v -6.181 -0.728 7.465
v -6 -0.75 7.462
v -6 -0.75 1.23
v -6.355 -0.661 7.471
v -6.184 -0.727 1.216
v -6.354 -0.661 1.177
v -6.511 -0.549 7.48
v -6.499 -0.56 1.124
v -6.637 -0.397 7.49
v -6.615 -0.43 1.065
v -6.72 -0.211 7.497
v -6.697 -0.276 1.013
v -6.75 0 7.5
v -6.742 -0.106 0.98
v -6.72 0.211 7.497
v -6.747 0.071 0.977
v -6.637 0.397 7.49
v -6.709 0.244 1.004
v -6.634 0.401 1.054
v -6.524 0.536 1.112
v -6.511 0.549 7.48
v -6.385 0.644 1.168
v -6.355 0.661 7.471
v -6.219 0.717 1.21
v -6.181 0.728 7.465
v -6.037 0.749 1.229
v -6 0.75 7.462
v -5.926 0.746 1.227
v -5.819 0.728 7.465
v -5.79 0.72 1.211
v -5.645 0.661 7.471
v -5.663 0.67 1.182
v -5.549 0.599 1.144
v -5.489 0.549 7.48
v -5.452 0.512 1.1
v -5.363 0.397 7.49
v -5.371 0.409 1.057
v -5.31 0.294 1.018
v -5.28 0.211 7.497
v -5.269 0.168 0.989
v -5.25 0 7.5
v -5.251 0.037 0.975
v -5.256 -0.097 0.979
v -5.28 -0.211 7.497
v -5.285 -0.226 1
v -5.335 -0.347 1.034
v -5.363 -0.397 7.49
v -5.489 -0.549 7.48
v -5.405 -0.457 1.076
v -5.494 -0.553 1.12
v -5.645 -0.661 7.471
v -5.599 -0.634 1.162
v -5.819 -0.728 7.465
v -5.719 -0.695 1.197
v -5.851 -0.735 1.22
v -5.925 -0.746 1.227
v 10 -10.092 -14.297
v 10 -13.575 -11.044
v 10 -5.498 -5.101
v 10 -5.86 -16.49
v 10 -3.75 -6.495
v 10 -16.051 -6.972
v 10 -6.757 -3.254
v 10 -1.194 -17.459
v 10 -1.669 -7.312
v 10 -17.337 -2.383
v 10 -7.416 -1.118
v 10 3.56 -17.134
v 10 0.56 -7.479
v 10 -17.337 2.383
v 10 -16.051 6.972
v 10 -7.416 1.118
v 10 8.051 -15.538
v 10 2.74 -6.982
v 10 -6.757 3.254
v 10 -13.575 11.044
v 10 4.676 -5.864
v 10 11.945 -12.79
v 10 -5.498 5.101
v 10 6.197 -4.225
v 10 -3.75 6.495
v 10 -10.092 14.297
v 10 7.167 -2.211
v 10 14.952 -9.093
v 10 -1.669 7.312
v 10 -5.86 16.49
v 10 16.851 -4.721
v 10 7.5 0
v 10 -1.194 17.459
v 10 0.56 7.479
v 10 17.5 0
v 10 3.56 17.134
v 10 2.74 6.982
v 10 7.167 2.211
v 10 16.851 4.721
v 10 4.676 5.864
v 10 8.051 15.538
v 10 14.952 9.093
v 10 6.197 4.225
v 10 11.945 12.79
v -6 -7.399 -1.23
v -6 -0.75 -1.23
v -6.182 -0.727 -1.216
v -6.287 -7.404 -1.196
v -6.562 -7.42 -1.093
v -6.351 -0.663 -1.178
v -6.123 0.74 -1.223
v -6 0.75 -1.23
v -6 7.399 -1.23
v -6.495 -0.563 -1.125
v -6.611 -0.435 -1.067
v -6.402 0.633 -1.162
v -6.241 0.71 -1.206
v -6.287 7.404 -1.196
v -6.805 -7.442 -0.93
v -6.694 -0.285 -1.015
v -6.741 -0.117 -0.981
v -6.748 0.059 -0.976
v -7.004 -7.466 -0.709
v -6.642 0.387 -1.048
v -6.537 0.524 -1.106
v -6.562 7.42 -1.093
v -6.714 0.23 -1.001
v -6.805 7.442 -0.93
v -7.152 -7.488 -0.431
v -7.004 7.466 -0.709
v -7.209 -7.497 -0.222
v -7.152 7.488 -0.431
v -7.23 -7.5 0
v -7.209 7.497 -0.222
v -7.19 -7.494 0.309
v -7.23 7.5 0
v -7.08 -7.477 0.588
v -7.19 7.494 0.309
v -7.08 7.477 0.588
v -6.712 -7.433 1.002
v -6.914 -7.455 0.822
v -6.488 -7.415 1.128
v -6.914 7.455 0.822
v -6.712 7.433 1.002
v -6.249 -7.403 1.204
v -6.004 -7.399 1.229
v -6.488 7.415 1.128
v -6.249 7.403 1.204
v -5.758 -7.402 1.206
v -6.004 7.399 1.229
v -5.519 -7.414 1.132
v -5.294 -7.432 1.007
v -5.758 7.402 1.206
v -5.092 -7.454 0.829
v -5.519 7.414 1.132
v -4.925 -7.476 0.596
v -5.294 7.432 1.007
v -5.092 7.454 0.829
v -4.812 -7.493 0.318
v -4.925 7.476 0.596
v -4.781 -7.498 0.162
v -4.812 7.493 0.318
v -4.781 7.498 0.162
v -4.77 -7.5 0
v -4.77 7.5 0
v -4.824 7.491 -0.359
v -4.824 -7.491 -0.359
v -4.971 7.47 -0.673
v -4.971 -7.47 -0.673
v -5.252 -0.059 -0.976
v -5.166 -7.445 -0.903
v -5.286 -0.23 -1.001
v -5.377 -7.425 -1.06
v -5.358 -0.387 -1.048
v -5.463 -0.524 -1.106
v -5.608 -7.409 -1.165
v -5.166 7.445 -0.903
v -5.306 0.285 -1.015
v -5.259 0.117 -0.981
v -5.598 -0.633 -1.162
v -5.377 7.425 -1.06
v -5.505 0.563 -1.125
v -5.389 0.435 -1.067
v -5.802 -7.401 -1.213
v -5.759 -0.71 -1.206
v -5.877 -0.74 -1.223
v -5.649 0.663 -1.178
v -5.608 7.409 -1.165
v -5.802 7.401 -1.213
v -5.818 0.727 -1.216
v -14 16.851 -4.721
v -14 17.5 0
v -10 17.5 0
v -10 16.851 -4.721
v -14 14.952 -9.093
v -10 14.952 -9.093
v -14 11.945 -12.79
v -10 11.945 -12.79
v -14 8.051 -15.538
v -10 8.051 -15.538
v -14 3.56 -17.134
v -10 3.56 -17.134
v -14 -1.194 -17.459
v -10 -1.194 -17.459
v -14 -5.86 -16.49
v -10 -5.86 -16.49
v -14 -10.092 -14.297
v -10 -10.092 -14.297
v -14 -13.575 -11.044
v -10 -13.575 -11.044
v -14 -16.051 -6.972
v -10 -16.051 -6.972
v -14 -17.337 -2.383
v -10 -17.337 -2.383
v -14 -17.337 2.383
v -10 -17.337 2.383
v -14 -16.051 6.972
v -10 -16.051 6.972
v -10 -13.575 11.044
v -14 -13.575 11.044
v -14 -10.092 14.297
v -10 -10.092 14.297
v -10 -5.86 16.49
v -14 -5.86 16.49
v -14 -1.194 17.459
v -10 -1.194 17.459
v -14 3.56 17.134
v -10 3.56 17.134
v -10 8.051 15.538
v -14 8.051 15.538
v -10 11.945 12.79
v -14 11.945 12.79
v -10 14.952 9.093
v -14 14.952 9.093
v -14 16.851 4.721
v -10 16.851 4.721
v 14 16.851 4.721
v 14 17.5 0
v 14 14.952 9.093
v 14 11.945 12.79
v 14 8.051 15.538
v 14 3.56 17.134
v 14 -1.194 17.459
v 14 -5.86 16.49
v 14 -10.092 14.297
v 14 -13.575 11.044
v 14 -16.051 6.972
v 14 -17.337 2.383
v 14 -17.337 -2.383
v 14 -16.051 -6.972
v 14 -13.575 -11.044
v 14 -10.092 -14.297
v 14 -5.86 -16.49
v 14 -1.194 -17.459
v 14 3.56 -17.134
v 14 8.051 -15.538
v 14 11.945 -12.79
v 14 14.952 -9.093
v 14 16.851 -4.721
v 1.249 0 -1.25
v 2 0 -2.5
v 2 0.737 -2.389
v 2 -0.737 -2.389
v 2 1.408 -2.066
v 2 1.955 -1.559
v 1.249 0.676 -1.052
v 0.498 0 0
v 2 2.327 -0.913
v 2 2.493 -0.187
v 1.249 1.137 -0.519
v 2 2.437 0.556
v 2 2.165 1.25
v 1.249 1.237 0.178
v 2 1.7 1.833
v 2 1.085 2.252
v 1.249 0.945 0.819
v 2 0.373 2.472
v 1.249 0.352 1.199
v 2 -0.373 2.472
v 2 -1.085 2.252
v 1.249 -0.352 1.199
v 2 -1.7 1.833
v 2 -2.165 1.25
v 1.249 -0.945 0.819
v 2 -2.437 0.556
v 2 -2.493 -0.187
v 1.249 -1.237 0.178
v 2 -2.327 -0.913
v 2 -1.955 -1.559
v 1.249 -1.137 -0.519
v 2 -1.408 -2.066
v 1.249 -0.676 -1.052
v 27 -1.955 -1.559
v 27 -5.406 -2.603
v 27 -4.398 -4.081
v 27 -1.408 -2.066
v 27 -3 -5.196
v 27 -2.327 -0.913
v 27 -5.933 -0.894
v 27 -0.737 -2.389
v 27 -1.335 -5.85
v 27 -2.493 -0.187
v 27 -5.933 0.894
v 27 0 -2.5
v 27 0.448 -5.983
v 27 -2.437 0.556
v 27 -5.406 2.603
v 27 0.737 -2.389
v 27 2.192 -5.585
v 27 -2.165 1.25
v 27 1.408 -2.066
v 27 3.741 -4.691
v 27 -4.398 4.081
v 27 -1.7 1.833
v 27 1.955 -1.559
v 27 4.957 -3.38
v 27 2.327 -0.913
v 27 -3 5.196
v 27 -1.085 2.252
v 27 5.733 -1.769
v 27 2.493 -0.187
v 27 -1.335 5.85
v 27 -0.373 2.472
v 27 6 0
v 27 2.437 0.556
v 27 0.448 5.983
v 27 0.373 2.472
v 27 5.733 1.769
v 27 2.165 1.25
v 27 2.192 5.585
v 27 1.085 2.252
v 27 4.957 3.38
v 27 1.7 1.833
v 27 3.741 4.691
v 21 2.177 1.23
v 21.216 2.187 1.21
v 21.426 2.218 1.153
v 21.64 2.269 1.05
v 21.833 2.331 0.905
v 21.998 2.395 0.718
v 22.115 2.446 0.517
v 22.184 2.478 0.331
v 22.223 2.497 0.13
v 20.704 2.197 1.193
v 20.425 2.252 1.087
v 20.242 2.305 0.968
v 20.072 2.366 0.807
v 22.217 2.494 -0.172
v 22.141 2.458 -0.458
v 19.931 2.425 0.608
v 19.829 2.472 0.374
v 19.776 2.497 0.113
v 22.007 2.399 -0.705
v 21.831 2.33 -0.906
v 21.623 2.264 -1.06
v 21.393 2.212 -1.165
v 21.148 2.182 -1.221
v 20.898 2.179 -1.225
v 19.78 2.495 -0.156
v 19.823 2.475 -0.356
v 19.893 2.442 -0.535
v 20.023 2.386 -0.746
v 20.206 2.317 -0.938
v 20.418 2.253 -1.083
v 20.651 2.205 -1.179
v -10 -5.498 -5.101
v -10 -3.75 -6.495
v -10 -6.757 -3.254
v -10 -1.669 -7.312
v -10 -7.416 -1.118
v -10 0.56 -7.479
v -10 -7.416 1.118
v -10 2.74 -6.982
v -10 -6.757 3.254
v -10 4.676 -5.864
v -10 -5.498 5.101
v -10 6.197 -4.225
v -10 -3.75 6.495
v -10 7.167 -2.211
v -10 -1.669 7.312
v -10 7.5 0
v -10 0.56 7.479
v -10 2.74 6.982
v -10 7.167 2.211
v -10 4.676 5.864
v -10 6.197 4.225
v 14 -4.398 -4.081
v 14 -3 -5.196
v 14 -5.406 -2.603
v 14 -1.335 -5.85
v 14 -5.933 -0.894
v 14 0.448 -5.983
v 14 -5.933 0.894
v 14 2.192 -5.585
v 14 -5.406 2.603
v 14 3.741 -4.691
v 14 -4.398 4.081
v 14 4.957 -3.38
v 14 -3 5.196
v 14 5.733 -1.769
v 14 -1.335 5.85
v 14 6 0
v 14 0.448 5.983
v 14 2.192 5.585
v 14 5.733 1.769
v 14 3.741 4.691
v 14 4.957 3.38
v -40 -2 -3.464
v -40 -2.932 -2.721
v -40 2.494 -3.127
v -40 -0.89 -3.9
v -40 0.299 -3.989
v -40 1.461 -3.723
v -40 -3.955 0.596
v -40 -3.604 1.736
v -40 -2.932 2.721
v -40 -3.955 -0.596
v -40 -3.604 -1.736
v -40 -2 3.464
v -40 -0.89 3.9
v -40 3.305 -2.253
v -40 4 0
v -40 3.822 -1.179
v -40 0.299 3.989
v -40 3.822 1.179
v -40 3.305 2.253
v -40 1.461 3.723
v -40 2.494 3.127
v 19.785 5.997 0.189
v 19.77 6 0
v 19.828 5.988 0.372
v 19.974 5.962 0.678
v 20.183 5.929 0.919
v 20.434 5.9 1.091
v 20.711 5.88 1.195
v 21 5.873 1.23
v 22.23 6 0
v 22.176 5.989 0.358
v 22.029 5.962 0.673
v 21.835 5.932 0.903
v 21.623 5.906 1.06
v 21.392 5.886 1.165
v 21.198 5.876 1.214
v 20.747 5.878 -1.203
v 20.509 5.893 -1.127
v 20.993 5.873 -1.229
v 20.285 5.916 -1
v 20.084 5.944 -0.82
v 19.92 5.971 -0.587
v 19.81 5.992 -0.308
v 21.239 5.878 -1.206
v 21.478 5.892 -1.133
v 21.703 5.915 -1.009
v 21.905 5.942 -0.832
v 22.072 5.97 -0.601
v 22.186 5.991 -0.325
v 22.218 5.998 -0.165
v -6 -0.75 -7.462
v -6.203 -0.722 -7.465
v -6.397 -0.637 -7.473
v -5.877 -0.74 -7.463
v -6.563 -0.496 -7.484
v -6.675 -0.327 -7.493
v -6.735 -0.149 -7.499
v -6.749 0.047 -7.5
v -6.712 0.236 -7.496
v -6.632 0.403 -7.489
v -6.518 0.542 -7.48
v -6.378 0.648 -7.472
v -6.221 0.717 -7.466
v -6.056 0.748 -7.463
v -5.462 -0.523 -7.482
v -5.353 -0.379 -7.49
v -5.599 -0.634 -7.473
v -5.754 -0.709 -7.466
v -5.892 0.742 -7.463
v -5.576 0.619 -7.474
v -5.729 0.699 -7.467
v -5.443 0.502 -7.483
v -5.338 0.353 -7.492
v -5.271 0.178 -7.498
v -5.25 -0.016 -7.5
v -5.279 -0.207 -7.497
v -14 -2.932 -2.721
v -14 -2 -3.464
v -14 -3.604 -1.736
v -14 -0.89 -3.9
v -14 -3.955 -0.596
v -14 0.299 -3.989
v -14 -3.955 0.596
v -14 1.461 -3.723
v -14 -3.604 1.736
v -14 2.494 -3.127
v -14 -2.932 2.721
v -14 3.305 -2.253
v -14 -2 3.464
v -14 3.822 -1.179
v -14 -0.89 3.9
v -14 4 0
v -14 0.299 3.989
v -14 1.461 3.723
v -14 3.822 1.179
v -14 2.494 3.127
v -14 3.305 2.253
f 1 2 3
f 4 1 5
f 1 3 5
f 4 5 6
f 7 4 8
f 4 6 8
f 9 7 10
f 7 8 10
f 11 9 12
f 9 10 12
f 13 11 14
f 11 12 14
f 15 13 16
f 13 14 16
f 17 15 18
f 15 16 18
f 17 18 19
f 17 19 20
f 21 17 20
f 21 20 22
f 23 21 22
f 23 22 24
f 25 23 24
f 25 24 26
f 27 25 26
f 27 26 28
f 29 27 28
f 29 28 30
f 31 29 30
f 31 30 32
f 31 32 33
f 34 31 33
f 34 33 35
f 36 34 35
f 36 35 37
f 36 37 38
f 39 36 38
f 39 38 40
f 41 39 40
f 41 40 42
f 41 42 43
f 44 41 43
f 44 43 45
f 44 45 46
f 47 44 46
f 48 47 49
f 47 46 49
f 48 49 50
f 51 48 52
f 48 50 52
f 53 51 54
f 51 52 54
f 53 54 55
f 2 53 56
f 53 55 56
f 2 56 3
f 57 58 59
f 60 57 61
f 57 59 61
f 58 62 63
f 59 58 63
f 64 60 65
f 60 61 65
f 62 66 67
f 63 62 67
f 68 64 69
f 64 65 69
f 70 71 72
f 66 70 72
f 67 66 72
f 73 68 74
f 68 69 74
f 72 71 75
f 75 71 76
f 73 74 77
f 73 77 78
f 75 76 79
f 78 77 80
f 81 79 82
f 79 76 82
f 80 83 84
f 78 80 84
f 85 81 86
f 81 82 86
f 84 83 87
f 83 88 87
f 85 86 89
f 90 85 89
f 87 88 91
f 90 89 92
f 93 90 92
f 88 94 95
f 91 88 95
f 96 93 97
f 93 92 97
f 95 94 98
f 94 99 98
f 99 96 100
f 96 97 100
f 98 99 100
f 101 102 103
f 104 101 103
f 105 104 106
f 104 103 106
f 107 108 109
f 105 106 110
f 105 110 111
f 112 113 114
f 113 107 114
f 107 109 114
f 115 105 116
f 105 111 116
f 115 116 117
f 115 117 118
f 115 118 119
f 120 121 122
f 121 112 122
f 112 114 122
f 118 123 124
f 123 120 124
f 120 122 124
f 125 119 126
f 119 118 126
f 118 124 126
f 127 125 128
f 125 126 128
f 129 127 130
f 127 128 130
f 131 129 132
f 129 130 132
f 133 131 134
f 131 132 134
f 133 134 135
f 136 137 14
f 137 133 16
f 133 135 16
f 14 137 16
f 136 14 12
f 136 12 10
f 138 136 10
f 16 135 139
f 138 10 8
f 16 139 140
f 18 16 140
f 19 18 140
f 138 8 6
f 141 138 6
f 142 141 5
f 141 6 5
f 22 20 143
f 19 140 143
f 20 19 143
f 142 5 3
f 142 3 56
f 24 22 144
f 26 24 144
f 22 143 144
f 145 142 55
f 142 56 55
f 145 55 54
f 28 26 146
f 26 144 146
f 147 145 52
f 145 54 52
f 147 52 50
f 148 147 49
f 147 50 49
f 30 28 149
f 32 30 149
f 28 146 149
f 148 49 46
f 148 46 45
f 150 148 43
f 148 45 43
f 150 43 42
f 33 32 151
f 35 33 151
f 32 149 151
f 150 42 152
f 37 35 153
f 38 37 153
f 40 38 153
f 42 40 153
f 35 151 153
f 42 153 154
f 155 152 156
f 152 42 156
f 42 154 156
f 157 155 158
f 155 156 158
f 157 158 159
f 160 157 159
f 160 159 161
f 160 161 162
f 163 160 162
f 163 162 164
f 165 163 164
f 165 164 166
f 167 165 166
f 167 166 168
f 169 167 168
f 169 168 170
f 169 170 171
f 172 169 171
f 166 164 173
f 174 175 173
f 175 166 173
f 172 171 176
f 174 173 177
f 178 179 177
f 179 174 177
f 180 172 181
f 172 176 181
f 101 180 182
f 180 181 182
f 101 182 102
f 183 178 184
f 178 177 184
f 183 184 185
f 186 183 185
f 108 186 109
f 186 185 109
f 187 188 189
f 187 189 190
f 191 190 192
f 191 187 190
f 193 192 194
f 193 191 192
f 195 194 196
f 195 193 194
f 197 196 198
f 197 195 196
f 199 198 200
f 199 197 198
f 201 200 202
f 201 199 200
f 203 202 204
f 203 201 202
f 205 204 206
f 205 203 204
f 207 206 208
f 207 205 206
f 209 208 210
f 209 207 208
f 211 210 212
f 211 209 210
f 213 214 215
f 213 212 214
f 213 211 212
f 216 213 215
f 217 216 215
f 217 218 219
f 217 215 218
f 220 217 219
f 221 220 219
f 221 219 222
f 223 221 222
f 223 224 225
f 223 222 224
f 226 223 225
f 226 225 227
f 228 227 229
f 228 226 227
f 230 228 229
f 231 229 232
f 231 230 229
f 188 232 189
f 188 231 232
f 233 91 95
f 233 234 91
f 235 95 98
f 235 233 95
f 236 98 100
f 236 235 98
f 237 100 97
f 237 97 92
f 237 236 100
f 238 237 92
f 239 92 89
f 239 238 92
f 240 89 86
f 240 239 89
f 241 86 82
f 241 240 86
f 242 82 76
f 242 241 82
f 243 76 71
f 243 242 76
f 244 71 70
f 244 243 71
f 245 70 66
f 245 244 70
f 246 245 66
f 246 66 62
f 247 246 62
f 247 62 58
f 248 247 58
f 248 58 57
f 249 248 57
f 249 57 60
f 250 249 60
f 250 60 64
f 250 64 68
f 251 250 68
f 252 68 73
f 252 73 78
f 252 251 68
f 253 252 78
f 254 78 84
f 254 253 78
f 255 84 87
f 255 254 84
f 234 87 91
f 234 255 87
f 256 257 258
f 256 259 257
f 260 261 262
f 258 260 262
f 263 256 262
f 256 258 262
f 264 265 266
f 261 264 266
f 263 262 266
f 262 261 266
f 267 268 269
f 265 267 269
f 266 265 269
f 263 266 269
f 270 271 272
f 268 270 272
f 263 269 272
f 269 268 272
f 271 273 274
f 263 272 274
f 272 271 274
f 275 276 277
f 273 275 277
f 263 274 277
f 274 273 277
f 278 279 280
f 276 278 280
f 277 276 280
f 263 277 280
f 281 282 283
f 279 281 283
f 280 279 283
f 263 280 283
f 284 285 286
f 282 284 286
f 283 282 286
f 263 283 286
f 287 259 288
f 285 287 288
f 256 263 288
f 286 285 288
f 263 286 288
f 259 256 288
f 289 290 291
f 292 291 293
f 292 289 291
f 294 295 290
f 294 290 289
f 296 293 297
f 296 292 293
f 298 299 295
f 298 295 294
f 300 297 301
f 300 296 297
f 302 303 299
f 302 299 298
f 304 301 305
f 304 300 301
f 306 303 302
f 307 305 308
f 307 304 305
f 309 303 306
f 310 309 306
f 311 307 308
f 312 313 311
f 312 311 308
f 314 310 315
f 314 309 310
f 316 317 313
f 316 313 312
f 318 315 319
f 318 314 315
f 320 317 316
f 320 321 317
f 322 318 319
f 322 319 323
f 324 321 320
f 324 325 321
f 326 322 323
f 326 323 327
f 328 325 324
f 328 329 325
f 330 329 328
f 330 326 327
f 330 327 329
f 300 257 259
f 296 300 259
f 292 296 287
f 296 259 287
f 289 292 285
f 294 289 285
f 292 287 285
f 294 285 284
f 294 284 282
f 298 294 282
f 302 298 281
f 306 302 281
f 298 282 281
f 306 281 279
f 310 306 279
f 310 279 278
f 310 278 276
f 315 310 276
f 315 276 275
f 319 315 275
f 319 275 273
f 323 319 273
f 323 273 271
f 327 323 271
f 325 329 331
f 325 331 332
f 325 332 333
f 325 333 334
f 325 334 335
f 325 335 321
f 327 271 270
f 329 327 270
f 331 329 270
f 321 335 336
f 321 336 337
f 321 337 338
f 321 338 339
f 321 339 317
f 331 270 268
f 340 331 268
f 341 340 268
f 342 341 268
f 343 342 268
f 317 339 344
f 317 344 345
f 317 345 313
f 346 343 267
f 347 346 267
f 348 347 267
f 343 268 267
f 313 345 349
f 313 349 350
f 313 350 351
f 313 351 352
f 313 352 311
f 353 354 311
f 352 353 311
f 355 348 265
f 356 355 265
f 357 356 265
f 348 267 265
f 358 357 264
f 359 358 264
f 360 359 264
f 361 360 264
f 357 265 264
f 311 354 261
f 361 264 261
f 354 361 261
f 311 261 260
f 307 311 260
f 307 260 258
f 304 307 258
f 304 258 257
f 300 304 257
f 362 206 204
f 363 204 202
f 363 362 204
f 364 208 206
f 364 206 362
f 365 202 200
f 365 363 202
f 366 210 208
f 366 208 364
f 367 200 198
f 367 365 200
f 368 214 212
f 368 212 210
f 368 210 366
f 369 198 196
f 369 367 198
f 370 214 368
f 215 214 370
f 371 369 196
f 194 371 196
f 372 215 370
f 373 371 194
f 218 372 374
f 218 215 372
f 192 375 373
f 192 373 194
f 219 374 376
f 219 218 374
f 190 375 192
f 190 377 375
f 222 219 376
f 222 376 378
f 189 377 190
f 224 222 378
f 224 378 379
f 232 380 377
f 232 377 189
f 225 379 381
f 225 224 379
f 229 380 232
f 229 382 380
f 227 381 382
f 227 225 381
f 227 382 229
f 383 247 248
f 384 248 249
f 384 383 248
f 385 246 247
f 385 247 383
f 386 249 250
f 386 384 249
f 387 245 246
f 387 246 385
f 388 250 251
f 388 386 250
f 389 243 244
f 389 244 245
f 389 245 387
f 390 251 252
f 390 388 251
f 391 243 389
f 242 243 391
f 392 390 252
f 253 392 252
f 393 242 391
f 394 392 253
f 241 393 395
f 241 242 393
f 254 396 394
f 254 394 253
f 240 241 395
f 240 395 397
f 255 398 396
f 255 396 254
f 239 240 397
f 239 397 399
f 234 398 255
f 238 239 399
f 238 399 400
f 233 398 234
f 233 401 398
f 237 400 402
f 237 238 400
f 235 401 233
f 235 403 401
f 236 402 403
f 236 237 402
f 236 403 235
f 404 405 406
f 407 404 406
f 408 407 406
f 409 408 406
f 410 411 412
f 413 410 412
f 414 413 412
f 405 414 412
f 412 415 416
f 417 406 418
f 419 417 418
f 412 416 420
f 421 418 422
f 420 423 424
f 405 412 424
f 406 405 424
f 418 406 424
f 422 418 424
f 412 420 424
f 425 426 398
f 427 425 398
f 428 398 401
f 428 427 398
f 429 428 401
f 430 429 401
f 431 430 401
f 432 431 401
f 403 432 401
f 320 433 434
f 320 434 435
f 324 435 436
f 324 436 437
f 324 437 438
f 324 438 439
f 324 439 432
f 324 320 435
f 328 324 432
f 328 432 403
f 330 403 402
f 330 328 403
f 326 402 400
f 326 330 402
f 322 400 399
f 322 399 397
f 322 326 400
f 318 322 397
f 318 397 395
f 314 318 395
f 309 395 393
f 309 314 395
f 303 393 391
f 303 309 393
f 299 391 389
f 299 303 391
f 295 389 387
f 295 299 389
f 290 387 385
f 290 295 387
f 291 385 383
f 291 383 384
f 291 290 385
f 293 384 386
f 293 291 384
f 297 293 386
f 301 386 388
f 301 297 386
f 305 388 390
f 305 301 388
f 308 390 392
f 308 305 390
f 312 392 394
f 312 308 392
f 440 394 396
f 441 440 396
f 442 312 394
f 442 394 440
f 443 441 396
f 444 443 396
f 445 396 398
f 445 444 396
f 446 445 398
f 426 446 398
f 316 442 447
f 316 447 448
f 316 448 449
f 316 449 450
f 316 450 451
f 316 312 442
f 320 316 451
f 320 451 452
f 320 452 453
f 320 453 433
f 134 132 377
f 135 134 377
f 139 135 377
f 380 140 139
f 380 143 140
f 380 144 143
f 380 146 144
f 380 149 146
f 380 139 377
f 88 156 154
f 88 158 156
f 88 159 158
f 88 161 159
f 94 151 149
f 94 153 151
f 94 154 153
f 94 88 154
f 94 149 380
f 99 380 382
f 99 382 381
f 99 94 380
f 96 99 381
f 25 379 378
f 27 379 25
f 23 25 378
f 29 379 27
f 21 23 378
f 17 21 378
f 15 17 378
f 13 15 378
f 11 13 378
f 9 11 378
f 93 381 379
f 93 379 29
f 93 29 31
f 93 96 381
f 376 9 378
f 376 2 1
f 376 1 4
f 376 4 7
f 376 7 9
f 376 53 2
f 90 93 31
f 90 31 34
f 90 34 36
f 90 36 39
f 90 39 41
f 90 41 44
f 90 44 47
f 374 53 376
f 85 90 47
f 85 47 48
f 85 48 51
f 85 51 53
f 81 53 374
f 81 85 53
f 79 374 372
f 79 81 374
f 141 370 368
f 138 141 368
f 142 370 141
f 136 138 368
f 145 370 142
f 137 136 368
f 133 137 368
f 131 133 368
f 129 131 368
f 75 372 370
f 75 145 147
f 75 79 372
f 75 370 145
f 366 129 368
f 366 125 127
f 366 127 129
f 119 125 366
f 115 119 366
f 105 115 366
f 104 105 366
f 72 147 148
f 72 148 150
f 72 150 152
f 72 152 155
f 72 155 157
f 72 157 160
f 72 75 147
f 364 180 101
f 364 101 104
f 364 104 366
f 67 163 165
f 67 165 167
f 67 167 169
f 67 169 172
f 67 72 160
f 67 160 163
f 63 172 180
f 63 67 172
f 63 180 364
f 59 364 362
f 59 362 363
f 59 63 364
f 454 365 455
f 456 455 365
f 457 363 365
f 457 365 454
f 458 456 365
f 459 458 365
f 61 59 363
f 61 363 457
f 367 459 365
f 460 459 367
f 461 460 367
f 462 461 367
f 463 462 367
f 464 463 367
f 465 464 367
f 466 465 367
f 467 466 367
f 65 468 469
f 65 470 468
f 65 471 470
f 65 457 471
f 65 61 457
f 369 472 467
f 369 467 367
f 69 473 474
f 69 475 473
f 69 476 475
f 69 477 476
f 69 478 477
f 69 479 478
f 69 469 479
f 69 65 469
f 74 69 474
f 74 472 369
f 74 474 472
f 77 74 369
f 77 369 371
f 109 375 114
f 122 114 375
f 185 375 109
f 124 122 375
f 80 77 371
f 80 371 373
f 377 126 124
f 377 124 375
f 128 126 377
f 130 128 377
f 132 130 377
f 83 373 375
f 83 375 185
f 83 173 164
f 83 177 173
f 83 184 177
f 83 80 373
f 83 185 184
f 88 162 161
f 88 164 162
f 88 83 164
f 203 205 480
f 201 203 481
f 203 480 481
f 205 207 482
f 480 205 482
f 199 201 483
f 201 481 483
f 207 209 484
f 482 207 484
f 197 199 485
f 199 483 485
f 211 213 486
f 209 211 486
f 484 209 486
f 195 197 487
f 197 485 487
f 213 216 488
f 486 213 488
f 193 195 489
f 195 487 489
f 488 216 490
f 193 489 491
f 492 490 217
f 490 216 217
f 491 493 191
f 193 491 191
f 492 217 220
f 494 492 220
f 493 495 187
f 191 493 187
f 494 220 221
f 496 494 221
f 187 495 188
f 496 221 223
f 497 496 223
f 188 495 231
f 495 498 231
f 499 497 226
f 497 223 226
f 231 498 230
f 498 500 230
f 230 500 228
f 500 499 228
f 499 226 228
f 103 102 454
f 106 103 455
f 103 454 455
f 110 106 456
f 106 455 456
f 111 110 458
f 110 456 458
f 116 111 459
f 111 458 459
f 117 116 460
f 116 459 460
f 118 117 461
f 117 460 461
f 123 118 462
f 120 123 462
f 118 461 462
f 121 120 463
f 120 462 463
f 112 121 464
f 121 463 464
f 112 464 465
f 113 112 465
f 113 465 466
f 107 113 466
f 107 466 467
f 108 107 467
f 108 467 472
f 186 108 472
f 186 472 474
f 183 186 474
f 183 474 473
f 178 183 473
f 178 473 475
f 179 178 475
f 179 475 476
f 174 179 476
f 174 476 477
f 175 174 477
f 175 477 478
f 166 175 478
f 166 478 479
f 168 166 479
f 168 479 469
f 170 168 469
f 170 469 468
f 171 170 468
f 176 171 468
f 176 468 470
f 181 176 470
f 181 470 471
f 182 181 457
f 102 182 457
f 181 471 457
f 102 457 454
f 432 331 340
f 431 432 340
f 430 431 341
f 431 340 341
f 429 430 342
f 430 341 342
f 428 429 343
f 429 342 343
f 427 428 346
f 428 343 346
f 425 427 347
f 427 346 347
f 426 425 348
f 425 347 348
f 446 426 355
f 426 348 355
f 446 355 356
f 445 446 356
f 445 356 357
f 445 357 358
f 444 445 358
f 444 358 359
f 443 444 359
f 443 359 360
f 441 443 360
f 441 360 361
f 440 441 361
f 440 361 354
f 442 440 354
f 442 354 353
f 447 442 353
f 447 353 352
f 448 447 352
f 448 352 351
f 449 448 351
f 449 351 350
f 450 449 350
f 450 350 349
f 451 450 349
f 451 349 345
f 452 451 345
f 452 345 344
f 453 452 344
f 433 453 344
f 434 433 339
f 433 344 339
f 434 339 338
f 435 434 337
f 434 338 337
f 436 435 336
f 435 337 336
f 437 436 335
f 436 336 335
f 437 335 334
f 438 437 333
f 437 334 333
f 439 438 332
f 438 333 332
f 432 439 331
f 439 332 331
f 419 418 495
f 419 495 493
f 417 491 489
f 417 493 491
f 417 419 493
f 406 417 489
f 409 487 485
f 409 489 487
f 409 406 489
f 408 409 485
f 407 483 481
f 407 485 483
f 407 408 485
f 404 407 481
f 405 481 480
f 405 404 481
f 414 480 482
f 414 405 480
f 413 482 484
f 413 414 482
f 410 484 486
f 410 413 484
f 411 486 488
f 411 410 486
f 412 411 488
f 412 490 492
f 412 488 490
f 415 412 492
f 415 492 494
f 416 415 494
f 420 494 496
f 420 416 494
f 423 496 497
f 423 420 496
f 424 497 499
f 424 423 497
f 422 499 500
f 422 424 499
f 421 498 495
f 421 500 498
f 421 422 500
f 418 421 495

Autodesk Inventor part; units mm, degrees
sketch "Skizze1" plane through (0, 0, 0) normal (0, 0, 1) x (1, 0, 0)
  line L0 (-53.4, 0) -> (40.4, 0) projected
  line L1 (0, -3.5) -> (0, 21) projected
  line L2 (-10, 7.5) -> (10, 7.5)
  line L3 (10, 7.5) -> (10, 17.5)
  line L4 (10, 17.5) -> (14, 17.5)
  line L5 (14, 17.5) -> (14, 6)
  line L6 (14, 6) -> (27, 6)
  line L7 (27, 6) -> (27, 0)
  line L8 (-10, 7.5) -> (-10, 17.5)
  line L9 (-10, 17.5) -> (-14, 17.5)
  line L10 (-14, 17.5) -> (-14, 4)
  line L11 (-14, 4) -> (-40, 4)
  line L12 (-40, 4) -> (-40, 0)
  line L13 (-40, 0) -> (27, 0)
  point P0 (0, 0)
  dimension "d0" = 20
  dimension "d1" = 15
  dimension "d2" = 28
  dimension "d3" = 10
  dimension "d4" = 8
  dimension "d5" = 40
  dimension "d6" = 12
  dimension "d7" = 27
revolve "Umdrehung1" add sketch "Skizze1" angle 360 about axis through (-40, 0, 0) along (1, 0, 0)
ref_plane "Arbeitsebene1" through (0, 0, 7.5) normal (0, 0, 1) x (1, 0, 0)
ref_plane "Arbeitsebene2" through (0, -7.5, 0) normal (0, 1, 0) x (-1, 0, 0)
sketch "Skizze2" plane through (0, 0, 7.5) normal (0, 0, 1) x (1, 0, 0)
  line L0 (-53.4, 0) -> (40.4, 0) projected
  line L1 (0, -24.5) -> (0, 24.5) projected
  point P0 (0, 0)
  point P1 (-6, 0)
  dimension "d9" = 6
hole "Bohrung1" at (-6, 0, 7.5) direction (0, 0, -1) diameter 1.5 end through all
sketch "Skizze3" plane through (0, -7.5, 0) normal (0, 1, 0) x (-1, 0, 0)
  line L0 (53.4, 0) -> (-40.4, 0) projected
  line L1 (0, -24.5) -> (0, 24.5) projected
  point P0 (0, 0)
  point P1 (6, 0)
  dimension "d17" = 6
hole "Bohrung2" at (-6, -7.5, 0) direction (0, 1, 0) diameter 2.459 end through all thread size "M3x0.5" class "6H" standard "ISO Metric profile"
hole "Bohrung3" at (27, 0, 0) direction (-1, 0, 0) diameter 5 depth 25 tip angle 118
ref_plane "Arbeitsebene3" through (20.5, 6, 0) normal (0, 1, 0) x (-1, 0, 0)
sketch "Skizze6" plane through (20.5, 6, 0) normal (0, 1, 0) x (-1, 0, 0)
  line L0 (-6.5, 6) -> (-6.5, -6) projected
  line L1 (73.9, 0) -> (-19.9, 0) projected
  line L2 (20.5, -24.5) -> (20.5, 24.5) projected
  point P0 (20.5, 0)
  point P1 (-0.5, 0)
  dimension "d36" = 6
hole "Bohrung4" at (21, 6, 0) direction (0, -1, 0) diameter 2.459 end up to surface thread size "M3x0.5" class "6H" standard "ISO Metric profile"
properties part number "13_0204_055"
